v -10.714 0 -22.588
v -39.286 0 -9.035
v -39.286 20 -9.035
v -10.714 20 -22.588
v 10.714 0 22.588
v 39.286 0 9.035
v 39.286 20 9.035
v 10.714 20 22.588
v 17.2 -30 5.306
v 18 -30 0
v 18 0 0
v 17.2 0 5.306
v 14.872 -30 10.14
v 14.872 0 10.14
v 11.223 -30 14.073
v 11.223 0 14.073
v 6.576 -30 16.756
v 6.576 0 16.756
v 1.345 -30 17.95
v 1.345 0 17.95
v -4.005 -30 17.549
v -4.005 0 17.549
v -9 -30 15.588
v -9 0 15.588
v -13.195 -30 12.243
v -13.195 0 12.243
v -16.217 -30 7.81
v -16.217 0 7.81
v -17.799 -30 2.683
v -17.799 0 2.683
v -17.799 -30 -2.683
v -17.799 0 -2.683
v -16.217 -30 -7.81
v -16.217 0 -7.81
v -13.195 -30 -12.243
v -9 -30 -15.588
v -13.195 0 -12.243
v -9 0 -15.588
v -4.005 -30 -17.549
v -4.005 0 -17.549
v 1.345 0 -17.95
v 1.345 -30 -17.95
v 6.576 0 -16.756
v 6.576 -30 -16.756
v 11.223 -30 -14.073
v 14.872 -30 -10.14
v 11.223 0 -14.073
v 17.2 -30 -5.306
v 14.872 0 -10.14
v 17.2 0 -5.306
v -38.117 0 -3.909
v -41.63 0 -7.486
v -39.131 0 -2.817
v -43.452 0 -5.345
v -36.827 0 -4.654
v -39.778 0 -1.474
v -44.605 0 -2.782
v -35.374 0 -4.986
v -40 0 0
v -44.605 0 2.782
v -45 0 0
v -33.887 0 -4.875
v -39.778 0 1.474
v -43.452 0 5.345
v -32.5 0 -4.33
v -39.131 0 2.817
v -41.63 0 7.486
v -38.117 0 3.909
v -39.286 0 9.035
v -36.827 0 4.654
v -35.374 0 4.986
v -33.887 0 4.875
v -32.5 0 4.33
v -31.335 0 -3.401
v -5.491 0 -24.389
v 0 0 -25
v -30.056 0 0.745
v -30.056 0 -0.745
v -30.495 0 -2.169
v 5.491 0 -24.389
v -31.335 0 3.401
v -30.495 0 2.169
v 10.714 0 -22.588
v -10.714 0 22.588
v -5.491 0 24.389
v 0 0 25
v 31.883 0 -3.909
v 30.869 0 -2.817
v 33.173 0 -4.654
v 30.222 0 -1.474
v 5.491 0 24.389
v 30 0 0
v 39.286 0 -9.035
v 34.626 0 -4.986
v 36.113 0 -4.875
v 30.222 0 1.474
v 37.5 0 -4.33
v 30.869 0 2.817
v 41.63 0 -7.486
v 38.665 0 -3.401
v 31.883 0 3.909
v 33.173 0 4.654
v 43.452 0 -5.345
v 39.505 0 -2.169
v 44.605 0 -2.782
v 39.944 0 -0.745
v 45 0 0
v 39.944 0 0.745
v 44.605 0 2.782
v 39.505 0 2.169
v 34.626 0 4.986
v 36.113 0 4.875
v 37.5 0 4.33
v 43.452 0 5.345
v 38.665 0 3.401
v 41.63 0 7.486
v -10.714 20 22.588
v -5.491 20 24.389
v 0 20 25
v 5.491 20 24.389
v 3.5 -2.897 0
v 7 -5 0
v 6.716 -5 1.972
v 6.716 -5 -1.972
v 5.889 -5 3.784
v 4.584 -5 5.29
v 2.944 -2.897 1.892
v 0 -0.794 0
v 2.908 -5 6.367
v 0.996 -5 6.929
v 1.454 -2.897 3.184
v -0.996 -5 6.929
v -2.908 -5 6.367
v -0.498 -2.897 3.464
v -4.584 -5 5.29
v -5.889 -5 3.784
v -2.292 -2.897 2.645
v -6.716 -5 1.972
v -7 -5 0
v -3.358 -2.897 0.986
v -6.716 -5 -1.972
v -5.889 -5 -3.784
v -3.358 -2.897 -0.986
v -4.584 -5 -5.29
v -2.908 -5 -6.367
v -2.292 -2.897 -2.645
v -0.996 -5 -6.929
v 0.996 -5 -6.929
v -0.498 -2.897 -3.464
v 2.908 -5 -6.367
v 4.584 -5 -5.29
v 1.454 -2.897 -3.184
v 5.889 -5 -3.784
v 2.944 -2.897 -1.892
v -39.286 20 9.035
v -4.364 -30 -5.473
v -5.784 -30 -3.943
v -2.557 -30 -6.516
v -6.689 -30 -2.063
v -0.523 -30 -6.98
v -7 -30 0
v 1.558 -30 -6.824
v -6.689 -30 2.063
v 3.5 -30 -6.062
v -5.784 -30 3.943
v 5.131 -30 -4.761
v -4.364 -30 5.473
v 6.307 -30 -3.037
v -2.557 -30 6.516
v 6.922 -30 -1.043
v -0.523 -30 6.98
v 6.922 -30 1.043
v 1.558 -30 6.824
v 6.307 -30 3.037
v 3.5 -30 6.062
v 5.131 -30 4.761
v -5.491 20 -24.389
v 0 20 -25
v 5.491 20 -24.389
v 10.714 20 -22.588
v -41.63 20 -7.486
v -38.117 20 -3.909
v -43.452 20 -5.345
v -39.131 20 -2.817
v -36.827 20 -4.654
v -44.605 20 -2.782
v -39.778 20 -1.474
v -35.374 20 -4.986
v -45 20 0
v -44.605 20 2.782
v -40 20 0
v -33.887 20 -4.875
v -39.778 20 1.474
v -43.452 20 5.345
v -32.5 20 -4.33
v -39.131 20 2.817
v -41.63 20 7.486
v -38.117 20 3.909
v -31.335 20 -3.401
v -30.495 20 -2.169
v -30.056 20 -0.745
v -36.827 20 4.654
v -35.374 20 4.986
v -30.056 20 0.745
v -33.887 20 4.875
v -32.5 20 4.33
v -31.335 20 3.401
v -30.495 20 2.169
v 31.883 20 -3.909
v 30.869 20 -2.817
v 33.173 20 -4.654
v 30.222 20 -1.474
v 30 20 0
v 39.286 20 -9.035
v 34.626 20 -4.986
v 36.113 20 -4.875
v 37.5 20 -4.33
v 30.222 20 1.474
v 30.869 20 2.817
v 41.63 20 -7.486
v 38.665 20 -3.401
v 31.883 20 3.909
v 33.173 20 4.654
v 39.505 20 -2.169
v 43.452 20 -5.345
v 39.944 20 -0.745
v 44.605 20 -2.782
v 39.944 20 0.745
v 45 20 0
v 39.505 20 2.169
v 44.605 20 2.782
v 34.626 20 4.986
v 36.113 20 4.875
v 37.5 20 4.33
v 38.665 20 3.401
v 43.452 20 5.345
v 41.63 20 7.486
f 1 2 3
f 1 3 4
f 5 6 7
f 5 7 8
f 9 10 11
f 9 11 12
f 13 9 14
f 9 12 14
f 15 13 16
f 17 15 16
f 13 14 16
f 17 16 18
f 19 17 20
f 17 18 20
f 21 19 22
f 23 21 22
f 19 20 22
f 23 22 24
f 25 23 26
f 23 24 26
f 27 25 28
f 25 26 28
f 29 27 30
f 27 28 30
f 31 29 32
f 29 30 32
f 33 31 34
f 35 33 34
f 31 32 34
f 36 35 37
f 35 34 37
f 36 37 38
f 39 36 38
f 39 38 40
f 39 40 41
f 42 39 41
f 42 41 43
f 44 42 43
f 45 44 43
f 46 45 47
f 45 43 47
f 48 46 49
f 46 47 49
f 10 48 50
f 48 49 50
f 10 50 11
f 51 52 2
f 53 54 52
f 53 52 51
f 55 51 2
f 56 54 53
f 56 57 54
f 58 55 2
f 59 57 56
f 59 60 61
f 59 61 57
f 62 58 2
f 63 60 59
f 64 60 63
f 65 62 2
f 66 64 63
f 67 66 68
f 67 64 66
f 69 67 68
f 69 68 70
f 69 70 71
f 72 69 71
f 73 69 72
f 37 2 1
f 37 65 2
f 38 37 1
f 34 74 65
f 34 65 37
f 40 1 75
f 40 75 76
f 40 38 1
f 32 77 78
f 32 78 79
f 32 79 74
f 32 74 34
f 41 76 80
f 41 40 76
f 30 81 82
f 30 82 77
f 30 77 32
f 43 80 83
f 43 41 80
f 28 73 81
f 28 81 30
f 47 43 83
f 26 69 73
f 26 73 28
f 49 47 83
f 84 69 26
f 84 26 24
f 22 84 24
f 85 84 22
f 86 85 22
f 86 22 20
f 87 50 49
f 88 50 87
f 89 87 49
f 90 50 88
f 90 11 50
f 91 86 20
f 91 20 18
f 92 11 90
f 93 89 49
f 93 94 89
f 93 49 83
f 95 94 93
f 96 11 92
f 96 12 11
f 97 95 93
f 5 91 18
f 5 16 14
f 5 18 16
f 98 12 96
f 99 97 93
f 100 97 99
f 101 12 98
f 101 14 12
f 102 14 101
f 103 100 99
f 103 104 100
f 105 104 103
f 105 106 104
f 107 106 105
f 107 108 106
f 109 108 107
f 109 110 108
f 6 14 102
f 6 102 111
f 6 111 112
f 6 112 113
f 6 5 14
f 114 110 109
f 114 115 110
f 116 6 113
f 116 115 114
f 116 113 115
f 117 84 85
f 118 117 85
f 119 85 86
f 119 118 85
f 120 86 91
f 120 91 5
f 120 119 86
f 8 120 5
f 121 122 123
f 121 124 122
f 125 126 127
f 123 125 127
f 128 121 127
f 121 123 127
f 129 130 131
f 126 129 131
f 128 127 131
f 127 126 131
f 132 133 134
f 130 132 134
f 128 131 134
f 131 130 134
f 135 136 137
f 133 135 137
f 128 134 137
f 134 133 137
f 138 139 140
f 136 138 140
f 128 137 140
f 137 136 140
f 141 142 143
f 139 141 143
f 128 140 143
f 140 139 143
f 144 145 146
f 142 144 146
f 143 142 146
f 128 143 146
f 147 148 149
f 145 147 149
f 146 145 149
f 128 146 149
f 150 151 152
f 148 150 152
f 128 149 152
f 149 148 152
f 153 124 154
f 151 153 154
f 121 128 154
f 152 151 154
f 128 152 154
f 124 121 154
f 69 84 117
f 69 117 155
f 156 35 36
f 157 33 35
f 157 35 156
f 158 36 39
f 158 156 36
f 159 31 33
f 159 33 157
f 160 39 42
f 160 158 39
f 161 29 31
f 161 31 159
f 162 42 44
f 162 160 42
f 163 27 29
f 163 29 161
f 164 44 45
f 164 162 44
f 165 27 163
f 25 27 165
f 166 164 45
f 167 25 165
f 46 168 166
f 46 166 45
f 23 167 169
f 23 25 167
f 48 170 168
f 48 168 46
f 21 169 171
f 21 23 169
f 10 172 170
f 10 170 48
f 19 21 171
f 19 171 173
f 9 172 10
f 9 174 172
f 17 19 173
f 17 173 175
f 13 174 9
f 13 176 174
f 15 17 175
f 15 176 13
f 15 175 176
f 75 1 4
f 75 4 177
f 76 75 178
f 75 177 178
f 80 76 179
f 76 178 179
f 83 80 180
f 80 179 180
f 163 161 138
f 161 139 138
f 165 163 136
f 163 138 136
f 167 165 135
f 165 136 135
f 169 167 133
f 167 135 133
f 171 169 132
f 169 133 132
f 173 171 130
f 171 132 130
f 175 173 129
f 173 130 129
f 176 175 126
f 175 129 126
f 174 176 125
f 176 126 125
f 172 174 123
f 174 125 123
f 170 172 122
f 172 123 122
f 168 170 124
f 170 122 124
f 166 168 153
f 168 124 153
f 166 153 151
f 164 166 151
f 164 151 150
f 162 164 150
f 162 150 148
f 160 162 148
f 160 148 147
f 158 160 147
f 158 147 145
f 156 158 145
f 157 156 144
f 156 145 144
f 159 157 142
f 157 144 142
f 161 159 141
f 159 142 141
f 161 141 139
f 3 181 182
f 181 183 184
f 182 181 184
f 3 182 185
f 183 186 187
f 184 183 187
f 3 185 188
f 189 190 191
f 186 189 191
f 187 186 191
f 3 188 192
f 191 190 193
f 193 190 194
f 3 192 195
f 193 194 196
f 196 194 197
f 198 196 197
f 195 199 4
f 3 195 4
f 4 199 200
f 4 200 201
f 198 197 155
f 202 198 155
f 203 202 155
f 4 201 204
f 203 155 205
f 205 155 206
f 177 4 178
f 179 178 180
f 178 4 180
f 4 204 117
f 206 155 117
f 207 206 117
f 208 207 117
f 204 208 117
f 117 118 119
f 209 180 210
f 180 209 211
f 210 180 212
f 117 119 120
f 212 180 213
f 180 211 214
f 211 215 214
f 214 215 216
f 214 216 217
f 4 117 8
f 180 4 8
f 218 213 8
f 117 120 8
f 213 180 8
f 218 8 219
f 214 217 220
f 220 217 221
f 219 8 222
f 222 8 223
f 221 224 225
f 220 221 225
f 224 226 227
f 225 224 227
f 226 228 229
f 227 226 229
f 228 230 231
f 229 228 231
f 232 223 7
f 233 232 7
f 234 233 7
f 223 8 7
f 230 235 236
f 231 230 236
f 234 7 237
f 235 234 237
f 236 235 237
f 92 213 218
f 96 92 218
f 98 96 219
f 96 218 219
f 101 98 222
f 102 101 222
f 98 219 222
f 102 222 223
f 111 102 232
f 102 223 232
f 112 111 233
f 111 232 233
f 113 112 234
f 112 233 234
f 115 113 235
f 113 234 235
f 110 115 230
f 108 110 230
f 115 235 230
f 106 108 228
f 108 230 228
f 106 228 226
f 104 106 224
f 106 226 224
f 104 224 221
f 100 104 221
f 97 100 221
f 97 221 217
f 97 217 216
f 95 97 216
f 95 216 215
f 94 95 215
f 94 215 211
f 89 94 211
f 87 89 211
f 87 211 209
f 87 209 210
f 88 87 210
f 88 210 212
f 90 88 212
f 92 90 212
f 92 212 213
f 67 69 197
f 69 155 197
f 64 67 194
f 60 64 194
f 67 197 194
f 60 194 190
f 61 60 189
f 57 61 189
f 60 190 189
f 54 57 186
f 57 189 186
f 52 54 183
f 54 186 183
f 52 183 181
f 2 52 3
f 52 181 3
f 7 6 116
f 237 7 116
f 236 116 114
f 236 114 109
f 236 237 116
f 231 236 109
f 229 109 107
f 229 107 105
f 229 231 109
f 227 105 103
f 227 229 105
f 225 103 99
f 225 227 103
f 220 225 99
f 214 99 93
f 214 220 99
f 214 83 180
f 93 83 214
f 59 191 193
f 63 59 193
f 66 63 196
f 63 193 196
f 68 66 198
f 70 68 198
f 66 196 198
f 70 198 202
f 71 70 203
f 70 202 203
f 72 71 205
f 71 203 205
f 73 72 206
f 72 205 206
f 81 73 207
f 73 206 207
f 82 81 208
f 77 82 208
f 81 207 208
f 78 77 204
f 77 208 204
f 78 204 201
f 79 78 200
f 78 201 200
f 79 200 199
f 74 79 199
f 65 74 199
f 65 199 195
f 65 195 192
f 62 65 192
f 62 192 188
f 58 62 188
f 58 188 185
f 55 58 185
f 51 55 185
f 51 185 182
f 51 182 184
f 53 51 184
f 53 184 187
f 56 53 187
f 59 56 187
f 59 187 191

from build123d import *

# Parameters (mm, degrees)
F1_DEPTH = 20
F2_R     = 25
F3_R     = 10
F4_R     = 18
F5_DEPTH = 30
F7_D     = 10
F8_D     = 14
F8_DEPTH = 25
F8_TIP   = 4.2060243332


with BuildPart() as f1:
    # F0 (on Front) → F1 (new body)
    with BuildSketch(Plane.XZ):
        Polygon((0, 27.6699295265), (-58.3333333333, 0), (0, -27.6699295265), (58.3333333333, 0), align=None)
    extrude(amount=-F1_DEPTH)

    # F2
    f2_edges = [f1.edges().sort_by_distance(p)[0] for p in [
        (0, 10, -27.66993),
        (0, 10, 27.66993),
    ]]
    fillet(f2_edges, radius=F2_R)

    # F3
    f3_edges = [f1.edges().sort_by_distance(p)[0] for p in [
        (-58.333333, 10, 0),
        (58.333333, 10, 0),
    ]]
    fillet(f3_edges, radius=F3_R)

    # F4 (on face) → F5 (join)
    with BuildSketch(Plane.XZ):
        Circle(F4_R)
    extrude(amount=F5_DEPTH)

    # F7 (through all)
    with Locations(Plane.XZ):
        with Locations((-35, 0), (35, 0)):
            Hole(F7_D / 2)

    # F8
    with Locations(Plane.XZ.offset(30)):
        with Locations((0, 0)):
            Hole(F8_D / 2, depth=F8_DEPTH)
            with Locations((0, 0, -(F8_DEPTH + F8_TIP / 2))):  # 118° drill point
                Cone(0, F8_D / 2, F8_TIP, mode=Mode.SUBTRACT)


solid = f1.part
